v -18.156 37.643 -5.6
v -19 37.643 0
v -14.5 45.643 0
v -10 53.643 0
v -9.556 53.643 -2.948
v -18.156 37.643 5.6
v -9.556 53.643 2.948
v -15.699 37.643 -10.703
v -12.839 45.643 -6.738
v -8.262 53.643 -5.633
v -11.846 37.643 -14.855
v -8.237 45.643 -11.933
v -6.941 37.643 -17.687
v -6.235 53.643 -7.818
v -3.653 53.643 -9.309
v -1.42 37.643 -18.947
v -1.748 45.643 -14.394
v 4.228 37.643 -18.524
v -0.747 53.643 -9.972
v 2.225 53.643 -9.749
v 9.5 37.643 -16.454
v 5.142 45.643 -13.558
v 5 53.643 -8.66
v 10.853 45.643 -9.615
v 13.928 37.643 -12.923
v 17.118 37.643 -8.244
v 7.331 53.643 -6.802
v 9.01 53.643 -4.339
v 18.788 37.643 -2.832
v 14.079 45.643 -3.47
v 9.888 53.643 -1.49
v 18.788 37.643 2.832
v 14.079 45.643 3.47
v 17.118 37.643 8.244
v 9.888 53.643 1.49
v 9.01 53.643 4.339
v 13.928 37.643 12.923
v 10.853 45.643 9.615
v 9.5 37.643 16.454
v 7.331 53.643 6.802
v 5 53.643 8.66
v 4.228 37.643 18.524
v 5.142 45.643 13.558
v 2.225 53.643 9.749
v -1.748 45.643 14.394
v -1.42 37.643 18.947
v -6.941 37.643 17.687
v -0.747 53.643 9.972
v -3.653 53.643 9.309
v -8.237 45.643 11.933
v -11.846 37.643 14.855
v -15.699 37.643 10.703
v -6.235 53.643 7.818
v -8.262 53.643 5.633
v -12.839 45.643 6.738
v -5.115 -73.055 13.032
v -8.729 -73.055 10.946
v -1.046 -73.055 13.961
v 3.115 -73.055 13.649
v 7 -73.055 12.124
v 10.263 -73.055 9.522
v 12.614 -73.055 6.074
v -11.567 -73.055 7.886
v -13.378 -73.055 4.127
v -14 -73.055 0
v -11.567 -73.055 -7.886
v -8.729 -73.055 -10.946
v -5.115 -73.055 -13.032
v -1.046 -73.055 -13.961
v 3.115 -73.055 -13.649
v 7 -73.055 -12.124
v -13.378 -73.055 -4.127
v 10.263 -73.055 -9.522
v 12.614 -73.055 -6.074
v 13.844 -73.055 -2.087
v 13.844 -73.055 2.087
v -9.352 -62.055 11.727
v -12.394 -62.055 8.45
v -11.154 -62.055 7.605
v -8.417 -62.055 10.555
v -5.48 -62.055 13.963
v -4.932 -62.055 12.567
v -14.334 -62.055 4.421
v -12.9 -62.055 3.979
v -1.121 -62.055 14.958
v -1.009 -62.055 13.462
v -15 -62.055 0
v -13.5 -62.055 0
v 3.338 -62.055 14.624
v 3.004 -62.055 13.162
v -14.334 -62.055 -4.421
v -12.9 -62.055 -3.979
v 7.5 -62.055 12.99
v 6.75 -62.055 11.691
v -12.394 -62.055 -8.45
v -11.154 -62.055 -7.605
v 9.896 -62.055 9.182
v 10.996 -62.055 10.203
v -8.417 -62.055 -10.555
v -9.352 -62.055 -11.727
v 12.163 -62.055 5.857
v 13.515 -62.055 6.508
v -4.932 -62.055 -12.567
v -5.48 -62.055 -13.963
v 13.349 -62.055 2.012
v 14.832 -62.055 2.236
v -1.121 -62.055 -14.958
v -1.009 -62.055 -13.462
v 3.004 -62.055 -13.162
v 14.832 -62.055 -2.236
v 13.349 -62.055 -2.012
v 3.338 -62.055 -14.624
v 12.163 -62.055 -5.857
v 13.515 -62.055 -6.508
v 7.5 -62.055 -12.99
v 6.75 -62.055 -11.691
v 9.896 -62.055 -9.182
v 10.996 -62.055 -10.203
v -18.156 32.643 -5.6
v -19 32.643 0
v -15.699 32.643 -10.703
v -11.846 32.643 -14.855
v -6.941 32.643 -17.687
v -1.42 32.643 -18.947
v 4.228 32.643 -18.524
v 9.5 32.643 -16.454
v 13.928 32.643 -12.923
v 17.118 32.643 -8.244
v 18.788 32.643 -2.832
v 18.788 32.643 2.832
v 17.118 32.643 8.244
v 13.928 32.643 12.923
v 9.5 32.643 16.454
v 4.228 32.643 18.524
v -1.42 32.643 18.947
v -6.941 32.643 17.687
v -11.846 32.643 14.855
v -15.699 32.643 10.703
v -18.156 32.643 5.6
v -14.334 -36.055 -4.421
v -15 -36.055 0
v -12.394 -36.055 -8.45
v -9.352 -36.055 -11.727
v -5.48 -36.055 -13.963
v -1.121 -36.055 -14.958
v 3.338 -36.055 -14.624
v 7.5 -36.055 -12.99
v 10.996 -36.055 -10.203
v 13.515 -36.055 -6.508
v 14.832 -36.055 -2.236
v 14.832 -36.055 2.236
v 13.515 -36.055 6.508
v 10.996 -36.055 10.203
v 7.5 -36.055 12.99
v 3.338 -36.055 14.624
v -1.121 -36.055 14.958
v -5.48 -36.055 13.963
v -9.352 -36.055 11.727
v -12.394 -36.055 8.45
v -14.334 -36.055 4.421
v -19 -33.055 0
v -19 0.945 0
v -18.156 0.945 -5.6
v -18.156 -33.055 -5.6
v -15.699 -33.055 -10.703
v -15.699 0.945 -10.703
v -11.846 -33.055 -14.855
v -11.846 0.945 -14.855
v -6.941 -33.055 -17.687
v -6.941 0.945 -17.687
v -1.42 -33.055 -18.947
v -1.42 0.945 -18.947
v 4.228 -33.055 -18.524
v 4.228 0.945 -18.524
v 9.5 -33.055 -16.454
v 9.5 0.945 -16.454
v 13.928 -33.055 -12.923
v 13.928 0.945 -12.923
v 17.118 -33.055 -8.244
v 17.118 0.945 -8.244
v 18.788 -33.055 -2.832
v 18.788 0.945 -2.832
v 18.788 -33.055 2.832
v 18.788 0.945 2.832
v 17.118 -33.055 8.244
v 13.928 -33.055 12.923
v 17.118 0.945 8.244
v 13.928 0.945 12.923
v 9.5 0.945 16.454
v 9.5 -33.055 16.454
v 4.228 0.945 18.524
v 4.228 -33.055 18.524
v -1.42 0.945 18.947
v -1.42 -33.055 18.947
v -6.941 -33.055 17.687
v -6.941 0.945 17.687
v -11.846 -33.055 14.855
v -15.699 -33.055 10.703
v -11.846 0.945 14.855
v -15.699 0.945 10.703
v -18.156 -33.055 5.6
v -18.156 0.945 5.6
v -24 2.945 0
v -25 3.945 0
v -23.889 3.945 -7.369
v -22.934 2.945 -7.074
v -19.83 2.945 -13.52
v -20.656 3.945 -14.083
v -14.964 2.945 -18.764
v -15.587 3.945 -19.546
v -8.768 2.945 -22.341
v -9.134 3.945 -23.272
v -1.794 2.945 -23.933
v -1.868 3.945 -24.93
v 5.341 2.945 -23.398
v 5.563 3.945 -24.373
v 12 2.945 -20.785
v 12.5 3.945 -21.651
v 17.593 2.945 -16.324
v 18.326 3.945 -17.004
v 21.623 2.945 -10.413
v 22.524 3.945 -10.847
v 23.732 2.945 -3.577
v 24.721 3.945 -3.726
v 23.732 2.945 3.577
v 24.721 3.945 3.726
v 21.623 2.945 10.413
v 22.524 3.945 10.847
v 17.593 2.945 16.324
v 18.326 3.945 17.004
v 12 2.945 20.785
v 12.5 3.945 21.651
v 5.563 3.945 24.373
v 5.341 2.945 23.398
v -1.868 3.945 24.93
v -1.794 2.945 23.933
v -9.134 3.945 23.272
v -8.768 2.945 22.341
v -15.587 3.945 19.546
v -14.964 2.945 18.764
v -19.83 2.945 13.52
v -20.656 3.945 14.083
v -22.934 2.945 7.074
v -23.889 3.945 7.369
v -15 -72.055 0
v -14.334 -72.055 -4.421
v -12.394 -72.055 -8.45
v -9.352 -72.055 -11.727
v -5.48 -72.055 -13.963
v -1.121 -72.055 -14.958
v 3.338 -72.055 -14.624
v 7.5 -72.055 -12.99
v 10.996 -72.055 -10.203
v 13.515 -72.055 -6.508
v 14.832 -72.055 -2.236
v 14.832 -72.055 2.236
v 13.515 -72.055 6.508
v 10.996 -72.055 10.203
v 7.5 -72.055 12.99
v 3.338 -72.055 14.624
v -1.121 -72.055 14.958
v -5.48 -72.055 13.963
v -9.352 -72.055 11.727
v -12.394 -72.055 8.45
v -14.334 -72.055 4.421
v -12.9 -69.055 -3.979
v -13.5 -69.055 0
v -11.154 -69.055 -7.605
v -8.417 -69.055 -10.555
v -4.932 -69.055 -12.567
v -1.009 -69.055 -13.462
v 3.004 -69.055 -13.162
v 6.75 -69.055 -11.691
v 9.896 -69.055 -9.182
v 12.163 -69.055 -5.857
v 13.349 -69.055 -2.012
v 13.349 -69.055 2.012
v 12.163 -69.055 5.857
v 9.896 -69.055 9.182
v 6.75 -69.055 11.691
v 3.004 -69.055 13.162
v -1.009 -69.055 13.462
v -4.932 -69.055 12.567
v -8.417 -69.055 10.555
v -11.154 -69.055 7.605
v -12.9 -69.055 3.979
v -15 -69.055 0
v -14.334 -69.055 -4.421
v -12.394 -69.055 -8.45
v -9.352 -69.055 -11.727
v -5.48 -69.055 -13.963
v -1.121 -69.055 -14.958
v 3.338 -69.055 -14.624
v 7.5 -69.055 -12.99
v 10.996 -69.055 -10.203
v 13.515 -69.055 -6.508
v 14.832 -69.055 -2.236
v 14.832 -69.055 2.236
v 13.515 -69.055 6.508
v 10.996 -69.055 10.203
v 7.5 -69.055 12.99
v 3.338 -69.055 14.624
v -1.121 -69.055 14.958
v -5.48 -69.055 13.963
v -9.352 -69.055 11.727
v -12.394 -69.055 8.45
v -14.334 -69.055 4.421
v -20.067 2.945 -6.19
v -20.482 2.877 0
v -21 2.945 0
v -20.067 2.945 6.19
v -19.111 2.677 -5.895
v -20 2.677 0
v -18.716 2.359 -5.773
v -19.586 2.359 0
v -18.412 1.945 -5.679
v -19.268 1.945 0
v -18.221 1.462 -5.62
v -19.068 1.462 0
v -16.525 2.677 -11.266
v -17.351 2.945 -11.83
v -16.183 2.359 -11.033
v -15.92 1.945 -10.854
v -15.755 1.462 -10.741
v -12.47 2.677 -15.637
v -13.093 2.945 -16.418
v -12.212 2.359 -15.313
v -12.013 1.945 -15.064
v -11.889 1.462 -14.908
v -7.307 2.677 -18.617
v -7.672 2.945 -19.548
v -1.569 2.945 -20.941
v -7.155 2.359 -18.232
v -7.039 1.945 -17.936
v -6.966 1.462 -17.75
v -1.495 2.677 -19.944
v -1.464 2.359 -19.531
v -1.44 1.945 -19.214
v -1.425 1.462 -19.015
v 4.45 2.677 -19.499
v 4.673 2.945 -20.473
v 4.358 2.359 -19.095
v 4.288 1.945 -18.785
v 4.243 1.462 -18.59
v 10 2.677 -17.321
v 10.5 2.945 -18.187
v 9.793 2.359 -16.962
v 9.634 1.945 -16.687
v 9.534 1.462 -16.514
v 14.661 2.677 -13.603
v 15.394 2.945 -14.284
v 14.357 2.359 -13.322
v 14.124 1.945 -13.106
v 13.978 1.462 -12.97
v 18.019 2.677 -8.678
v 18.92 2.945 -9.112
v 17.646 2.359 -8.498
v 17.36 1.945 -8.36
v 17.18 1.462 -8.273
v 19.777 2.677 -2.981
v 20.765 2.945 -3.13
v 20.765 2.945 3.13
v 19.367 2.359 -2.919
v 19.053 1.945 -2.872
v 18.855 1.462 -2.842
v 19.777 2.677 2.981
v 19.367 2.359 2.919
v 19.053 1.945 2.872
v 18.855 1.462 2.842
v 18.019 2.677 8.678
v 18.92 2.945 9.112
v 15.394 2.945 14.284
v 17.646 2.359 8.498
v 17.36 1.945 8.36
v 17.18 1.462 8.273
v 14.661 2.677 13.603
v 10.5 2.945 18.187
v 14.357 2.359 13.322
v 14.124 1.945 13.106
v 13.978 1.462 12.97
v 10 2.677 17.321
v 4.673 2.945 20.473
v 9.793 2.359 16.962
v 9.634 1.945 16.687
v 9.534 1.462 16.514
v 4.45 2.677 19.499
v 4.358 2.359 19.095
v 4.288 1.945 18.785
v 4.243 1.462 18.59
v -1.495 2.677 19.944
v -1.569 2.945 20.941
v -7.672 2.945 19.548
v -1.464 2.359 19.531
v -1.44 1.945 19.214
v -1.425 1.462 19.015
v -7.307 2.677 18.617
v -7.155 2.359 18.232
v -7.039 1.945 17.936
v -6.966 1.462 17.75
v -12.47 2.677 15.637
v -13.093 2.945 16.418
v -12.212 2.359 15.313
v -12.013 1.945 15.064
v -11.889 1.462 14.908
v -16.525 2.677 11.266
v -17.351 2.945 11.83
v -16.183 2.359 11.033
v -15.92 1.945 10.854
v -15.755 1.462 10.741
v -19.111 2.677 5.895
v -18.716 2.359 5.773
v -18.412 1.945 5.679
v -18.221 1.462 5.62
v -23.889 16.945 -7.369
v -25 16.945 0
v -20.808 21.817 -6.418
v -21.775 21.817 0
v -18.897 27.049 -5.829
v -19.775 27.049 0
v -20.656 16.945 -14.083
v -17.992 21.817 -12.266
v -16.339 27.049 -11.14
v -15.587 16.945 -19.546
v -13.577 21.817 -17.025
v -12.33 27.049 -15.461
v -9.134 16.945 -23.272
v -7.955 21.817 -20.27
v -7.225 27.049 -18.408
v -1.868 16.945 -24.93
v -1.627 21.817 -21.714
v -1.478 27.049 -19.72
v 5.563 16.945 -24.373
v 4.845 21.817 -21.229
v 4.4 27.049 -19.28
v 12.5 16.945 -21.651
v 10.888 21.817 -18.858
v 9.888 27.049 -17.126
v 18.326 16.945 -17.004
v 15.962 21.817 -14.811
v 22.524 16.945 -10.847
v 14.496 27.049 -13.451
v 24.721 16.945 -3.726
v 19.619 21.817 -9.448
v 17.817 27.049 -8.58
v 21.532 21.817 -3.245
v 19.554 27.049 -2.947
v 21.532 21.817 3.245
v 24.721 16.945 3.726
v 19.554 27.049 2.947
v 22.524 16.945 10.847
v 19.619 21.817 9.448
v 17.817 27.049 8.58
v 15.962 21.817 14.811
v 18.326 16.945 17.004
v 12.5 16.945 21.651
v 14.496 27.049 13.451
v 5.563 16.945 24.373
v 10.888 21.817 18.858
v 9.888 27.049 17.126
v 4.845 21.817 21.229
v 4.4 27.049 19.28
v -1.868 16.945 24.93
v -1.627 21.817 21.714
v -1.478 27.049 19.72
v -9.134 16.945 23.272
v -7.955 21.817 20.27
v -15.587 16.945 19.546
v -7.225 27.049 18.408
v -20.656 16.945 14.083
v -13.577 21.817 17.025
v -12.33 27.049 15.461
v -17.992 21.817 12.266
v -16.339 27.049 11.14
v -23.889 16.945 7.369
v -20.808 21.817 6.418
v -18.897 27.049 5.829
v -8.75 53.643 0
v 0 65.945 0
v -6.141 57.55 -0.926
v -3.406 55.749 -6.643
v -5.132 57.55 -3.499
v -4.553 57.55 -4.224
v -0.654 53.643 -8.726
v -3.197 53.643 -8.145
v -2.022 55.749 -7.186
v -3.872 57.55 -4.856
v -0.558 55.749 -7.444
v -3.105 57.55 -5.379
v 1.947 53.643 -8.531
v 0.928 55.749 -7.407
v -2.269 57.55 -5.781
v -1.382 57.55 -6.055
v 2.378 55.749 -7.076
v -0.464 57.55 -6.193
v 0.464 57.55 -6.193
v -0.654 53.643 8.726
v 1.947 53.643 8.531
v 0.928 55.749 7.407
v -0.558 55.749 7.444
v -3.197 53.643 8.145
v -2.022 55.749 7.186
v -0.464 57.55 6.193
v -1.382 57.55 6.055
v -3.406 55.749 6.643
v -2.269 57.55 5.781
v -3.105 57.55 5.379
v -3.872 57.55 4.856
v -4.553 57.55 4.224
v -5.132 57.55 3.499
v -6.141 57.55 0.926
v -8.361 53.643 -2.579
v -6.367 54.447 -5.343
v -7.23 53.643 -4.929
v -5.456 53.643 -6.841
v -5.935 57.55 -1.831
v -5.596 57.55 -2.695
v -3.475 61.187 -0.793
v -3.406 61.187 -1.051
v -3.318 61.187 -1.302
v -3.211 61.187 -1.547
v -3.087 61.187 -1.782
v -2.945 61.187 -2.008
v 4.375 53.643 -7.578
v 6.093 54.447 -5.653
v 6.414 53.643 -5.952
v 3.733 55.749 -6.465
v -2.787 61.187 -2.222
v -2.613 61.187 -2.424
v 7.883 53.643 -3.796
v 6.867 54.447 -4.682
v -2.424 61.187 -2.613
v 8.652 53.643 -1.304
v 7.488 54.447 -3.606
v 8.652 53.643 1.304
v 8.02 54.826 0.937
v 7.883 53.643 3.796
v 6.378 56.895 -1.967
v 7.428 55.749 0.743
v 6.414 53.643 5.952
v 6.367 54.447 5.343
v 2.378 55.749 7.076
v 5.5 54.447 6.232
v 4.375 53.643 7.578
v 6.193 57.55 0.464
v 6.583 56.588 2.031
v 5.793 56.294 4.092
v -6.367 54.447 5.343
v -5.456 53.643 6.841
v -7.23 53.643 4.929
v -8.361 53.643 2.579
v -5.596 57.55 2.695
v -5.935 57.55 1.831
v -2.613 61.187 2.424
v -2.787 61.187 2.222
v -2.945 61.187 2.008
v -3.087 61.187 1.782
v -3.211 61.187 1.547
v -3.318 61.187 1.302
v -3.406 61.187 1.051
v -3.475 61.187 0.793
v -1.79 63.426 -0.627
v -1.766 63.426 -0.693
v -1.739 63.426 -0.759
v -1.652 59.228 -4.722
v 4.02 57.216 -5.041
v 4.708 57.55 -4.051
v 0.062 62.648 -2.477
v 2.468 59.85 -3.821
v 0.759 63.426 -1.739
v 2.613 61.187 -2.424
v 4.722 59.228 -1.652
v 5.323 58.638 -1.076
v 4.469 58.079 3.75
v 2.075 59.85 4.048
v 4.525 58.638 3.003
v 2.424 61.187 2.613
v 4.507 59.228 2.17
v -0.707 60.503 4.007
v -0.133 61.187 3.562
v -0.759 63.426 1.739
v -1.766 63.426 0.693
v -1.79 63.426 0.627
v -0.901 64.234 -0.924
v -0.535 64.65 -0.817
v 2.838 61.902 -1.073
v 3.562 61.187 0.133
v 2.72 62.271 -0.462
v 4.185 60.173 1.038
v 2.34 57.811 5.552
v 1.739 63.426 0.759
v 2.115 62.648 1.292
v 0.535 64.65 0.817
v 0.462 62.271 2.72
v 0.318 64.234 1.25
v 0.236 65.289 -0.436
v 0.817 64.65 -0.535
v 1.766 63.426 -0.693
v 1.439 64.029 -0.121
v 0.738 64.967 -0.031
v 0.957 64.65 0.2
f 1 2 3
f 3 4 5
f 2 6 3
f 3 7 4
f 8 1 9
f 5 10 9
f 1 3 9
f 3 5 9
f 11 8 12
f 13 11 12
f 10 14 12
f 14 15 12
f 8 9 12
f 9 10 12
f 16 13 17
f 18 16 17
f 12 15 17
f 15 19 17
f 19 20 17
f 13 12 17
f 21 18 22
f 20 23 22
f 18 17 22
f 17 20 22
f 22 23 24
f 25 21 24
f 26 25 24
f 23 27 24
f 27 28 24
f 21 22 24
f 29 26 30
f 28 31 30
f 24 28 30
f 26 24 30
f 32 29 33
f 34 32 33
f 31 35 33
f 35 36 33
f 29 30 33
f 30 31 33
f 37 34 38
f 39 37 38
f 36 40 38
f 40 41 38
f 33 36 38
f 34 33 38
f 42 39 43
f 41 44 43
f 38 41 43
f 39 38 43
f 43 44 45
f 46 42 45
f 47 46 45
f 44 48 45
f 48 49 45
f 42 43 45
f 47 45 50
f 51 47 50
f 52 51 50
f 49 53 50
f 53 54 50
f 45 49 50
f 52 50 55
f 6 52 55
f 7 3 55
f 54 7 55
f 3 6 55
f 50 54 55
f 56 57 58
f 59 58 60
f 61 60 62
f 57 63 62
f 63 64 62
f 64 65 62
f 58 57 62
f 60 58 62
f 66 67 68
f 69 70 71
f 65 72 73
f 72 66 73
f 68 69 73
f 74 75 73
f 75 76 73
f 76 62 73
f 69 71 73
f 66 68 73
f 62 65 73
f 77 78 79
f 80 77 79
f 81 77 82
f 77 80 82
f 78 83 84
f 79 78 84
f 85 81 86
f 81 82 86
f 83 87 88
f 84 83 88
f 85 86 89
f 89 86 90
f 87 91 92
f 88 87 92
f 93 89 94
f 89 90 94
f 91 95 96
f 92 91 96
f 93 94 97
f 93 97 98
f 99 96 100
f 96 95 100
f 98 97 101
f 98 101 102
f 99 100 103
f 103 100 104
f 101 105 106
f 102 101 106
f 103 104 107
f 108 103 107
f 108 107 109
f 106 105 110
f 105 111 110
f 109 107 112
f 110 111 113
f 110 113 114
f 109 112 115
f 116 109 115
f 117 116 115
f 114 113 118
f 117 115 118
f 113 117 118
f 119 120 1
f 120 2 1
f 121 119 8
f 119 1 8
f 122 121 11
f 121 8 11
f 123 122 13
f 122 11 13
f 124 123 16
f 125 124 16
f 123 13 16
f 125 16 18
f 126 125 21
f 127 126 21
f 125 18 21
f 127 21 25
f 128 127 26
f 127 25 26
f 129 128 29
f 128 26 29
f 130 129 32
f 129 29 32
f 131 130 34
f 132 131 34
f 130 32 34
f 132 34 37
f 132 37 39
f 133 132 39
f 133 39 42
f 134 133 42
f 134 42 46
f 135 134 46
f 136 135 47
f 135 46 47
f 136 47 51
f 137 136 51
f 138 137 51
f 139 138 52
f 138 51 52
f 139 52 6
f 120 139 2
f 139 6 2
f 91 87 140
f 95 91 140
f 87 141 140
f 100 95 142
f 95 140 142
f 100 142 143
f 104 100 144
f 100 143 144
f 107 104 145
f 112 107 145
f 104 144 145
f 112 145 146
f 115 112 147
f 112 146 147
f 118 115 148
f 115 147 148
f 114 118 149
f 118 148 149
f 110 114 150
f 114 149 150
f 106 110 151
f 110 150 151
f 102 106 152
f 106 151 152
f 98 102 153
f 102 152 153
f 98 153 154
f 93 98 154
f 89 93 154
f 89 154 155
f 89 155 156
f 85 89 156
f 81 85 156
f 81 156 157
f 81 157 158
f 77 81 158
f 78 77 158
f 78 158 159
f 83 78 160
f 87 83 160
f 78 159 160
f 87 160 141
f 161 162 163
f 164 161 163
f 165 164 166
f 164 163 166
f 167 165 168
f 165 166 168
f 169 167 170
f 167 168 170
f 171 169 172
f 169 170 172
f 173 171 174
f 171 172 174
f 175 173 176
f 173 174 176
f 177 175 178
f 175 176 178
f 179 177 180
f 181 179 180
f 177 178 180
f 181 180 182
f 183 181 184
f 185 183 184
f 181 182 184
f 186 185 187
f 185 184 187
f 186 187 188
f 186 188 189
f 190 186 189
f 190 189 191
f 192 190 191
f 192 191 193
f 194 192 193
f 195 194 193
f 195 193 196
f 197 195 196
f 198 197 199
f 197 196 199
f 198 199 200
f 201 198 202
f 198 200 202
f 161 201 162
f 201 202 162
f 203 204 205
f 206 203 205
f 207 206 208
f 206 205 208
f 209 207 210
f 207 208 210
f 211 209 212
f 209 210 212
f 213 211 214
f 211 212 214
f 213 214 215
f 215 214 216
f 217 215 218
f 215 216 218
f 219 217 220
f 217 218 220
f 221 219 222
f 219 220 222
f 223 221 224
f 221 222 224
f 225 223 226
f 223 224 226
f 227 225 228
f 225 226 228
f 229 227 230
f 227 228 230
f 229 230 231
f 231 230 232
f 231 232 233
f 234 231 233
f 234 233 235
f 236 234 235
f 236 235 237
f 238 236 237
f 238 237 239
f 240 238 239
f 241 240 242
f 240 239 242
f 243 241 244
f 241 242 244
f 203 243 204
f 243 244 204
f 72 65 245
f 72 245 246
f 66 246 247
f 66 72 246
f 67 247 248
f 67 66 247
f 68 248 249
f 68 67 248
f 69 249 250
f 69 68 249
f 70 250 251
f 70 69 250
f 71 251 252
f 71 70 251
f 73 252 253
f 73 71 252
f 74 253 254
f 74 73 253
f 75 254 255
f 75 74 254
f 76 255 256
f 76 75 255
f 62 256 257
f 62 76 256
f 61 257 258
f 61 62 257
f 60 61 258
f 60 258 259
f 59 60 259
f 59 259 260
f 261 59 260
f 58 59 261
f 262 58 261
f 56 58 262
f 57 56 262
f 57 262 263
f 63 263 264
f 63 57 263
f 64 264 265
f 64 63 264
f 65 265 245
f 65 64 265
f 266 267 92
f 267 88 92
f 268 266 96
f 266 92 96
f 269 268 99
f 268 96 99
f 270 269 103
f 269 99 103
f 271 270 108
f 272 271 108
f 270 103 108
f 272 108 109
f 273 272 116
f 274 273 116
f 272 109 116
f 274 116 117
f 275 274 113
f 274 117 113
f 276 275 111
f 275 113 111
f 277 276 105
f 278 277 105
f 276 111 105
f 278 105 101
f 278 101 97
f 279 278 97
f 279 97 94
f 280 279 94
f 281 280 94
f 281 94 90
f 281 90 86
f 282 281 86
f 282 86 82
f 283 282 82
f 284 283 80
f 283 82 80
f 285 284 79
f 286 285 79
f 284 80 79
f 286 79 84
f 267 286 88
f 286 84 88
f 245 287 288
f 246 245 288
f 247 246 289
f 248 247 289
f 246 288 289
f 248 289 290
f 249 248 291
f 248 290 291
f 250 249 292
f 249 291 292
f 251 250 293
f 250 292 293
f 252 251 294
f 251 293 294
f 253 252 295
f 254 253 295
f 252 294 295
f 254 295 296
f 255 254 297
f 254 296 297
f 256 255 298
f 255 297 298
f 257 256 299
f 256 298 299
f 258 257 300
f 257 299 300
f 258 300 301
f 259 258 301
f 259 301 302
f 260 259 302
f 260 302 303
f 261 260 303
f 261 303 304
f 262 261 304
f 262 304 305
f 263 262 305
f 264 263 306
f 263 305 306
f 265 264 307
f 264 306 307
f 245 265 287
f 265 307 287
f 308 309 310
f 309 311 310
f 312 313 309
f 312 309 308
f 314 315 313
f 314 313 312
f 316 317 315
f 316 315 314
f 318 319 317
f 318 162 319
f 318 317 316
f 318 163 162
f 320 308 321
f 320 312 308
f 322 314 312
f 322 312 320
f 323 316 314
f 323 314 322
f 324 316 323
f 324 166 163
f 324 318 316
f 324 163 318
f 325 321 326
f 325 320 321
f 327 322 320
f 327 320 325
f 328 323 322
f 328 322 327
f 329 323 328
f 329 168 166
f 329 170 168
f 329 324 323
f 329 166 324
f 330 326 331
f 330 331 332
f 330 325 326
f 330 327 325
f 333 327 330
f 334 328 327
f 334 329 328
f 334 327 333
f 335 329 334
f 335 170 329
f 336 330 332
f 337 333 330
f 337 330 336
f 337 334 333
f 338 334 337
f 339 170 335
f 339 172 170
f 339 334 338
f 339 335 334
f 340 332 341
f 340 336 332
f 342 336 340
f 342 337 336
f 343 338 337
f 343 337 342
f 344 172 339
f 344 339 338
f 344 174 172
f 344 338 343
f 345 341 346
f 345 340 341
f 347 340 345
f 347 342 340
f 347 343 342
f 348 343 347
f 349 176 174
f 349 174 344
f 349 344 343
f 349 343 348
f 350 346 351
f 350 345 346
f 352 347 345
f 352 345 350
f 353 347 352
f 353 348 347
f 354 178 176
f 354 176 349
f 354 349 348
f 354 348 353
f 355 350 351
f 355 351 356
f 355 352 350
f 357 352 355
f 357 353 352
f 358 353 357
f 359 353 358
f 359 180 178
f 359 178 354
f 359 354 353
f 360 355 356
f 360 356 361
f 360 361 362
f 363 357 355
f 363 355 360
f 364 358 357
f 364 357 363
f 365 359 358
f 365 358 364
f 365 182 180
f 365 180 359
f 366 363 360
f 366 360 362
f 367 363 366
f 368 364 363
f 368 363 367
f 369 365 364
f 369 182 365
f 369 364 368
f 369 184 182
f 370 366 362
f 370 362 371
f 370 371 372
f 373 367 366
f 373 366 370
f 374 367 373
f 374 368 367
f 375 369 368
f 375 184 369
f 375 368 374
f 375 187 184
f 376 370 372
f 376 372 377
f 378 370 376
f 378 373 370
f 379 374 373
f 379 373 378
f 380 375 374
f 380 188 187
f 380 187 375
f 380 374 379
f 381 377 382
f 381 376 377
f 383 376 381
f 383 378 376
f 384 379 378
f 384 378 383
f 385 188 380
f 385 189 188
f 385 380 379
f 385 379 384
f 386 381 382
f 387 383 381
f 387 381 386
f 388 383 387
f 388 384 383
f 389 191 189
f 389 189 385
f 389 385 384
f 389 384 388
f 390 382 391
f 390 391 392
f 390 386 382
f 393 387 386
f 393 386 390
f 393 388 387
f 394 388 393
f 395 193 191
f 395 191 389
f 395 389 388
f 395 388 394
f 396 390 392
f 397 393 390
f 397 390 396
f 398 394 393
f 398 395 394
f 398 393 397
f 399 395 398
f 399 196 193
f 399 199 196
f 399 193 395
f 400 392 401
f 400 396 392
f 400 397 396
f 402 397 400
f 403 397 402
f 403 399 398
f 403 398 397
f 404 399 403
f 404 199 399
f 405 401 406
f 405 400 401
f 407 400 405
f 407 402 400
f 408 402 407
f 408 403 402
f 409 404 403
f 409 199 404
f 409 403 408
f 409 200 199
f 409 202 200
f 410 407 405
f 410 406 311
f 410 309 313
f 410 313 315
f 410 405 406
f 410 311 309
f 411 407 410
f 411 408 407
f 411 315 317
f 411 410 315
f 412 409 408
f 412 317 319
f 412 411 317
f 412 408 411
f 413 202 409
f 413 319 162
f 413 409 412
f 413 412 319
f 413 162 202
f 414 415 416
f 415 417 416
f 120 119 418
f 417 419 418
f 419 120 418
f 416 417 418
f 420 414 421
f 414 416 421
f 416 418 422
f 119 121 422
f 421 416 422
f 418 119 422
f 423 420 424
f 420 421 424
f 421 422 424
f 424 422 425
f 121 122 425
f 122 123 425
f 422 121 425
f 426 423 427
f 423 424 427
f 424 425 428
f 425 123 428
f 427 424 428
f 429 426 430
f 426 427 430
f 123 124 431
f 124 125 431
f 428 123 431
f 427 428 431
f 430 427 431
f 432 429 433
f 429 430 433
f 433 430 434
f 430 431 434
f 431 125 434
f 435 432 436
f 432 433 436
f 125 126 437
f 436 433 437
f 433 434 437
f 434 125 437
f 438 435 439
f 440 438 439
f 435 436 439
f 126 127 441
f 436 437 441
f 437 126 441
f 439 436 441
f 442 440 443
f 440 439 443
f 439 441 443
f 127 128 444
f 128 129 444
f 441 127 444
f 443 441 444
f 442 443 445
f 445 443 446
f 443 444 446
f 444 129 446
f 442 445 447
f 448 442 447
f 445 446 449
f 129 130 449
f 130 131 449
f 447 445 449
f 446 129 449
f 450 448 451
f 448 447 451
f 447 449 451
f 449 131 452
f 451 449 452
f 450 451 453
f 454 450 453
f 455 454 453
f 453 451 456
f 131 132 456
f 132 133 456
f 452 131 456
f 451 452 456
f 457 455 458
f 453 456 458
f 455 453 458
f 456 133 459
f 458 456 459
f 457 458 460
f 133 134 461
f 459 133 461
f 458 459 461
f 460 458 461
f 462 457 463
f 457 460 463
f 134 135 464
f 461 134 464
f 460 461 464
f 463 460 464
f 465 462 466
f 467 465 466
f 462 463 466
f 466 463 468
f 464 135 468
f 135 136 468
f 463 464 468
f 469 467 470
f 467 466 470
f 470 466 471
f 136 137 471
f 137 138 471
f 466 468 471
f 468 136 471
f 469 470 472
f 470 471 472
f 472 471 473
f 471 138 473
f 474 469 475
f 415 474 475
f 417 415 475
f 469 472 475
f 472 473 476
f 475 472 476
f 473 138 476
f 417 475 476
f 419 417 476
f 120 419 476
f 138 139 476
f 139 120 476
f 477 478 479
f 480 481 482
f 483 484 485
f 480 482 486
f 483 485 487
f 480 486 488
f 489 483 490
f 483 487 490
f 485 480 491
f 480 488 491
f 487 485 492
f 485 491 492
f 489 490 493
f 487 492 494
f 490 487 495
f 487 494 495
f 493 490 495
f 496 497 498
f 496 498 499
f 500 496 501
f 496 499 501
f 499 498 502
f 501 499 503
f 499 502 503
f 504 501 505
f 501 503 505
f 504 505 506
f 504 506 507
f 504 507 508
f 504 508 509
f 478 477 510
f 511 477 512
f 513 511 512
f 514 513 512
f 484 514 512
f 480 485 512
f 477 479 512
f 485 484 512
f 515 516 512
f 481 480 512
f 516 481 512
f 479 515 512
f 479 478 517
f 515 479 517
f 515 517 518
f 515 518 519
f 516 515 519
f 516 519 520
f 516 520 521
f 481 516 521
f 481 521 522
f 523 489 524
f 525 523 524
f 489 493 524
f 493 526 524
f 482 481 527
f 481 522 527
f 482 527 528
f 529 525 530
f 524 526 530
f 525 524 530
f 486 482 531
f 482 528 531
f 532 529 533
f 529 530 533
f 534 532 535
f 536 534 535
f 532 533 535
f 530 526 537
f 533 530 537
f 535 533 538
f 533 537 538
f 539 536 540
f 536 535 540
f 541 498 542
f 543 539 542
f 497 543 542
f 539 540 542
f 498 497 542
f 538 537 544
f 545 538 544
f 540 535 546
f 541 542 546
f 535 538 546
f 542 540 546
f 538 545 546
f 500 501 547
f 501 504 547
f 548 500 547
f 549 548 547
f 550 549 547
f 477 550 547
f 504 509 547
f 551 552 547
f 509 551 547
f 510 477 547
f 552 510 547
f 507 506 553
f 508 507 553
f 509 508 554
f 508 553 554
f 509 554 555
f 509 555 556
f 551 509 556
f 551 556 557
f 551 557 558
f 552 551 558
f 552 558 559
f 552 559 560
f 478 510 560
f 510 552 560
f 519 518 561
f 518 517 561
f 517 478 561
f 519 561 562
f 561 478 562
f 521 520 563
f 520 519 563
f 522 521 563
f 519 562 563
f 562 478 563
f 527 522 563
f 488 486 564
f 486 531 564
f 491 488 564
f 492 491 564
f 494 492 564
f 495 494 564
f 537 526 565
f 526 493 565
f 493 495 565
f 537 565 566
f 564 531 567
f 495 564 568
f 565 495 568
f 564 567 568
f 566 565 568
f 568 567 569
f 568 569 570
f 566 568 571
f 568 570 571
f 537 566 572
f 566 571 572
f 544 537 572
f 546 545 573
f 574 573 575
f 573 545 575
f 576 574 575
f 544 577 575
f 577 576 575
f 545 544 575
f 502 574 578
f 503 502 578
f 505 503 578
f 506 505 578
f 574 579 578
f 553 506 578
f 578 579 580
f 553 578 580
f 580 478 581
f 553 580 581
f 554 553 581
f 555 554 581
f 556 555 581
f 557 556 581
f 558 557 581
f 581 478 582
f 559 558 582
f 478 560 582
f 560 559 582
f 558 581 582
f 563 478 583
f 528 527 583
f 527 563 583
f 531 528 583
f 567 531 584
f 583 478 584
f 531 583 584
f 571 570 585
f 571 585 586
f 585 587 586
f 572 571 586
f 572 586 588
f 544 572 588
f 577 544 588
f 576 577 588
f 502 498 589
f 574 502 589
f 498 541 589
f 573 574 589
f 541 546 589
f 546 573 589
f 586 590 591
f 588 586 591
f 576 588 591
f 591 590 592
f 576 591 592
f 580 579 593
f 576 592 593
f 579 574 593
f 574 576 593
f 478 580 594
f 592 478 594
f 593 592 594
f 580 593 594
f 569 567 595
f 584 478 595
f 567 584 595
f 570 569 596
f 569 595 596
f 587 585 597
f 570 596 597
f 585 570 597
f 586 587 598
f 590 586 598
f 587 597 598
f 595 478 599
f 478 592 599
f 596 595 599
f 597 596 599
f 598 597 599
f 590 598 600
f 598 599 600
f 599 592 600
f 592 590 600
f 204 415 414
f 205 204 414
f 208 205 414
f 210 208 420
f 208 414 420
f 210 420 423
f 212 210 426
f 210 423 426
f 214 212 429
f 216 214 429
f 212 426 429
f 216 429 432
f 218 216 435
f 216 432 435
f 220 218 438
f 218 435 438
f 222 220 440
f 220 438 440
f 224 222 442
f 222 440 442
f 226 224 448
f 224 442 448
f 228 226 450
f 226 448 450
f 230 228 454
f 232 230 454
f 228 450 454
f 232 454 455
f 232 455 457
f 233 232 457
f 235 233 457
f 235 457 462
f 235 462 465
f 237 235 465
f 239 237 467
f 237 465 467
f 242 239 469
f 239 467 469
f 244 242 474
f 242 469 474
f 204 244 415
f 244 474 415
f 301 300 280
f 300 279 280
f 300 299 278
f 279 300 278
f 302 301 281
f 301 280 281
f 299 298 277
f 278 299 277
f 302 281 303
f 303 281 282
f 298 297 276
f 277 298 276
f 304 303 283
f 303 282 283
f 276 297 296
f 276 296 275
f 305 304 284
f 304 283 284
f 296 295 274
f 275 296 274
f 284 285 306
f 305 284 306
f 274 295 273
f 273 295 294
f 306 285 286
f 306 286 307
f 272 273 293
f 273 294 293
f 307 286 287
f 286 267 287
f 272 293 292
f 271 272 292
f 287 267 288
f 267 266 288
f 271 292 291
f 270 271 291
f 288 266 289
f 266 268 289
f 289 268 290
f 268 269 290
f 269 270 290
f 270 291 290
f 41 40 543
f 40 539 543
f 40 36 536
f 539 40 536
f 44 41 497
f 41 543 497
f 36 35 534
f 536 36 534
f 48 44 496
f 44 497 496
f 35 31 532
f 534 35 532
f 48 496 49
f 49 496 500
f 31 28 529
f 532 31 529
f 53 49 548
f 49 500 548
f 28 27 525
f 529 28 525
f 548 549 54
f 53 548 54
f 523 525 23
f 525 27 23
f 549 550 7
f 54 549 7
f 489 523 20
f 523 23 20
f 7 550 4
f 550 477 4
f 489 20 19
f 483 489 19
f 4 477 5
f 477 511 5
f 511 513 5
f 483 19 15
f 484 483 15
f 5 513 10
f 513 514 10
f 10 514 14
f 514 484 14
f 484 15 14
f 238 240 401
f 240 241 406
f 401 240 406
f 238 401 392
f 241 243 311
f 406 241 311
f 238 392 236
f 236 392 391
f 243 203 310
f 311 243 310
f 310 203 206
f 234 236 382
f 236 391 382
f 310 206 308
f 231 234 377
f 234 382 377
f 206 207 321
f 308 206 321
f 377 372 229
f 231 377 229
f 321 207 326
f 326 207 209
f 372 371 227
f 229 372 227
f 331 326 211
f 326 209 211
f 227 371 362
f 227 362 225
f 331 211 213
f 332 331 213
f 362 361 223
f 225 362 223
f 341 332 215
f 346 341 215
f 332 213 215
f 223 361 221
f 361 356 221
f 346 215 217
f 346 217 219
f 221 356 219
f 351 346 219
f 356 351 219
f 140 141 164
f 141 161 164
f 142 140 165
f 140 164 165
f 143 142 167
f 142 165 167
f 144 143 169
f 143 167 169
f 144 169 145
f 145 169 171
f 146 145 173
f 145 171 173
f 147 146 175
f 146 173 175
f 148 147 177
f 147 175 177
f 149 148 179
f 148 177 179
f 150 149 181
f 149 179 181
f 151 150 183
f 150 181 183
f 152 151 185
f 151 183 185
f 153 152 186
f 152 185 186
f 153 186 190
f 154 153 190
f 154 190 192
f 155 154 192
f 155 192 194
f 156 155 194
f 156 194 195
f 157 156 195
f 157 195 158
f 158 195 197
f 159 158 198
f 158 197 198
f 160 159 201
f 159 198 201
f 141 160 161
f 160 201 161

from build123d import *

# Parameters (mm, degrees)
CHANFREIN1_SIZE = 1
CONG_1_R        = 2
CHANFREIN2_SIZE = 1


with BuildPart() as part:
    # Esquisse1 → Révolution1 (revolve)
    with BuildSketch(Plane.XY):
        with BuildLine():
            Line((0, -73.055180274), (-15, -73.055180274))
            Line((-15, -73.055180274), (-15, -69.055180274))
            Line((-15, -69.055180274), (-13.5, -69.055180274))
            Line((-13.5, -69.055180274), (-13.5, -62.055180274))
            Line((-13.5, -62.055180274), (-15, -62.055180274))
            Line((-15, -62.055180274), (-15, -36.055180274))
            Line((-15, -36.055180274), (-19, -33.055180274))
            Line((-19, -33.055180274), (-19, 2.944819726))
            Line((-19, 2.944819726), (-25, 2.944819726))
            Line((-25, 2.944819726), (-25, 16.944819726))
            add(Edge.make_bspline(
                [(-25, 16.944819726), (-19.244550807, 23.982210742), (-19, 32.642645103)],
                knots=[0, 0, 0, 1, 1, 1], degree=2))
            Line((-19, 32.642645103), (-19, 37.642645103))
            Line((-19, 37.642645103), (-10, 53.642645103))
            Line((-10, 53.642645103), (-8.75, 53.642645103))
            add(Edge.make_bspline(
                [(-8.75, 53.642645103), (-8.046565442, 55.307116929), (0, 65.944819726)],
                knots=[0, 0, 0, 1, 1, 1], degree=2))
            Line((0, 65.944819726), (0, -73.055180274))
        make_face()
    revolve(axis=Axis((0, 65.944819726, 0), (0, -1, 0)))

    # Chanfrein1
    chanfrein1_edges = [part.edges().sort_by_distance(p)[0] for p in [
        (25, 2.944819726, 0),
    ]]
    chamfer(chanfrein1_edges, length=CHANFREIN1_SIZE)

    # Congé1
    cong_1_edges = [part.edges().sort_by_distance(p)[0] for p in [
        (19, 2.944819726, 0),
    ]]
    fillet(cong_1_edges, radius=CONG_1_R)

    # Chanfrein2
    chanfrein2_edges = [part.edges().sort_by_distance(p)[0] for p in [
        (15, -73.055180274, 0),
    ]]
    chamfer(chanfrein2_edges, length=CHANFREIN2_SIZE)


solid = part.part
